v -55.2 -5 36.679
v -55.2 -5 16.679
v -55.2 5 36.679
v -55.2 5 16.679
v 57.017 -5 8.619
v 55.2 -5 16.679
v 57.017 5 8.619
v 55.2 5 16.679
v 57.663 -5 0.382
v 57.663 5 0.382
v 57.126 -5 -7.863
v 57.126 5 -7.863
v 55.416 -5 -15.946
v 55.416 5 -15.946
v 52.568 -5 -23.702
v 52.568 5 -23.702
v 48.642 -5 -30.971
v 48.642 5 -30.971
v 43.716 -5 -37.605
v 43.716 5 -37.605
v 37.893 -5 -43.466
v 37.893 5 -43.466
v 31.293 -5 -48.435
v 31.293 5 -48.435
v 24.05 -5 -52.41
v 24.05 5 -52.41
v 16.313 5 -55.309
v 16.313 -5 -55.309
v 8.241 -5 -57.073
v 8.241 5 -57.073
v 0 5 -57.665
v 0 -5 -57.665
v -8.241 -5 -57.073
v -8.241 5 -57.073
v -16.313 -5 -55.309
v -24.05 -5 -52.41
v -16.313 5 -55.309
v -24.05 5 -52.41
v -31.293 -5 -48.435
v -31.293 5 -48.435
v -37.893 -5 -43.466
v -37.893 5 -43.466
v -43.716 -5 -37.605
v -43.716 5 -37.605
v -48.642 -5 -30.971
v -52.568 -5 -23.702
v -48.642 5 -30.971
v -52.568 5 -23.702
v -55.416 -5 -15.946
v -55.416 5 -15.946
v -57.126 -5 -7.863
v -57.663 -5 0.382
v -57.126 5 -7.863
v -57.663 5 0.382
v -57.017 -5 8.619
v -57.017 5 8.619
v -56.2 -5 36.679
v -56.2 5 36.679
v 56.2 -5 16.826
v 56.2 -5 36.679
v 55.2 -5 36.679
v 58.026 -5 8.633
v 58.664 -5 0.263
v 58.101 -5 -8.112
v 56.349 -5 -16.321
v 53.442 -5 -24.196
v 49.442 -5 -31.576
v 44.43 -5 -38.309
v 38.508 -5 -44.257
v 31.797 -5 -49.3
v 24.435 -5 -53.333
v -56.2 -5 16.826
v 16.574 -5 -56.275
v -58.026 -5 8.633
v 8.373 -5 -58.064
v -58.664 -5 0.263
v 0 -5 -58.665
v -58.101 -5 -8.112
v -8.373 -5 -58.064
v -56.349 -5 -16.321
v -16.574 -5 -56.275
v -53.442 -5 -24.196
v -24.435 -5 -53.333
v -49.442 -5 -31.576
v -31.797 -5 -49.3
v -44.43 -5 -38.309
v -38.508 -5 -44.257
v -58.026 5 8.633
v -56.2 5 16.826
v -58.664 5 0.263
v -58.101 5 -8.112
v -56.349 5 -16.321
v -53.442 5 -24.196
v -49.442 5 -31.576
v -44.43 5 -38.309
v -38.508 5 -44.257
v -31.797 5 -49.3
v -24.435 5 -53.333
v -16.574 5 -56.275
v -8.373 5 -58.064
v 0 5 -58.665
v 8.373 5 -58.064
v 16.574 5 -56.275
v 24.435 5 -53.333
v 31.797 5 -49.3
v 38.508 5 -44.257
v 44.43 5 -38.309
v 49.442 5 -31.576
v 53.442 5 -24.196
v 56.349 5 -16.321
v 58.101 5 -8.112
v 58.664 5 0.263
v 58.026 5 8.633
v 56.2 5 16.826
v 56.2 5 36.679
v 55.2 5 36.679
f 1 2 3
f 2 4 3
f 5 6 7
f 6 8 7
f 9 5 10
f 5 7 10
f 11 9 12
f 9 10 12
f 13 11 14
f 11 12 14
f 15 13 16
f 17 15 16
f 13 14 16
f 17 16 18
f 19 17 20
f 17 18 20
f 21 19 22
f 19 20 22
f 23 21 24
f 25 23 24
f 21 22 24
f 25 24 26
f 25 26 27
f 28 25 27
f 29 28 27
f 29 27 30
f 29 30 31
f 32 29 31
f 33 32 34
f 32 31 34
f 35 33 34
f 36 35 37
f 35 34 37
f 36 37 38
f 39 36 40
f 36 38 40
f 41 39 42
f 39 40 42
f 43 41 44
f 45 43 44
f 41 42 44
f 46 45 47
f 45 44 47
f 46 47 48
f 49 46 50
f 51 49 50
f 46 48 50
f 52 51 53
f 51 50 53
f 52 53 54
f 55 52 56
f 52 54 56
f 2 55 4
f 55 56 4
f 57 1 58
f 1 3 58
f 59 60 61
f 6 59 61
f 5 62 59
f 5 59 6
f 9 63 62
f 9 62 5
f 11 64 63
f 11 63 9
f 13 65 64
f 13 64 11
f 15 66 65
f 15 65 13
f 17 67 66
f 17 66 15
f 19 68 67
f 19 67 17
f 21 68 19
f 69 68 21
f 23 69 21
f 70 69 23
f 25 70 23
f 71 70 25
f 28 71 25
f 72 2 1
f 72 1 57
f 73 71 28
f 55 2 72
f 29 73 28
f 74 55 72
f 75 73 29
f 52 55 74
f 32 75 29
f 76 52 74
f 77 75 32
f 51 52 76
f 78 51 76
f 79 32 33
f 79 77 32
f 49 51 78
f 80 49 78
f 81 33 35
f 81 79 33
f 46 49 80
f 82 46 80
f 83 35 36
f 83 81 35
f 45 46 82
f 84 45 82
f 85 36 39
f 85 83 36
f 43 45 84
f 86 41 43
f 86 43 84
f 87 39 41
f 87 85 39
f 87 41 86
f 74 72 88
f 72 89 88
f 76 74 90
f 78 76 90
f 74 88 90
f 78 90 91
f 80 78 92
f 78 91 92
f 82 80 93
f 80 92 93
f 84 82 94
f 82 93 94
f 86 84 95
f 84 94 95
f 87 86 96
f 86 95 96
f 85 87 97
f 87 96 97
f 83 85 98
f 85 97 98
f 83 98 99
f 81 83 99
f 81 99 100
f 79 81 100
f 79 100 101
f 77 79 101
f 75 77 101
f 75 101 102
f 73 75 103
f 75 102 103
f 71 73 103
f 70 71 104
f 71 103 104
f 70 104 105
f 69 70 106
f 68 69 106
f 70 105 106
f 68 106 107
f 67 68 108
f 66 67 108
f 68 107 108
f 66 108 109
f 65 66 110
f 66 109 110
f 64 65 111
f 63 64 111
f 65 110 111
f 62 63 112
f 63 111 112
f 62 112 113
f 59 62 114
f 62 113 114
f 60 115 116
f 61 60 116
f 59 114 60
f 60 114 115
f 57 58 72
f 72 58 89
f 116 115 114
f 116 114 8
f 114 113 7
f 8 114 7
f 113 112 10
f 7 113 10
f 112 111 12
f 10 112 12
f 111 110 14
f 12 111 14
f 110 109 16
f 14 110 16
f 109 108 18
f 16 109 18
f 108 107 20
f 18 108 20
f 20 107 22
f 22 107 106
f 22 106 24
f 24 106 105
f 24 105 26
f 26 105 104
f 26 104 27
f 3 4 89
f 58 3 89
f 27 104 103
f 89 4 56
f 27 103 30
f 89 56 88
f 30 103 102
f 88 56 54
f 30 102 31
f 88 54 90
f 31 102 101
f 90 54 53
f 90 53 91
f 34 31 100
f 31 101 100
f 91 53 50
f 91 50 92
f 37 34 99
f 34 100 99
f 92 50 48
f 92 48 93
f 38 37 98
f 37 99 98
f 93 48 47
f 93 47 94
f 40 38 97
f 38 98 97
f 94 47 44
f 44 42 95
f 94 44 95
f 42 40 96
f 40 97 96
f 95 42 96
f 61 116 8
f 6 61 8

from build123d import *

# Parameters (mm, degrees)
EXTRUDE_THIN1_DEPTH = 5


with BuildPart() as part:
    # Sketch1 → Extrude-Thin1 (new, symmetric)
    with BuildSketch(Plane(origin=(0, 0, 0), x_dir=(1, 0, 0), z_dir=(0, 1, 0))):
        with BuildLine():
            Line((55.2, -36.678710461), (55.2, -16.678710461))
            ThreePointArc((55.2, -16.678710461), (0, 57.664715231), (-55.2, -16.678710461))
            Line((-55.2, -16.678710461), (-55.2, -36.678710461))
            Line((-55.2, -36.678710461), (-56.2, -36.678710461))
            Line((-56.2, -36.678710461), (-56.2, -16.825837665))
            ThreePointArc((-56.2, -16.825837665), (0, 58.664715231), (56.2, -16.825837665))
            Line((56.2, -16.825837665), (56.2, -36.678710461))
            Line((56.2, -36.678710461), (55.2, -36.678710461))
        make_face()
    extrude(amount=EXTRUDE_THIN1_DEPTH, both=True)


solid = part.part
